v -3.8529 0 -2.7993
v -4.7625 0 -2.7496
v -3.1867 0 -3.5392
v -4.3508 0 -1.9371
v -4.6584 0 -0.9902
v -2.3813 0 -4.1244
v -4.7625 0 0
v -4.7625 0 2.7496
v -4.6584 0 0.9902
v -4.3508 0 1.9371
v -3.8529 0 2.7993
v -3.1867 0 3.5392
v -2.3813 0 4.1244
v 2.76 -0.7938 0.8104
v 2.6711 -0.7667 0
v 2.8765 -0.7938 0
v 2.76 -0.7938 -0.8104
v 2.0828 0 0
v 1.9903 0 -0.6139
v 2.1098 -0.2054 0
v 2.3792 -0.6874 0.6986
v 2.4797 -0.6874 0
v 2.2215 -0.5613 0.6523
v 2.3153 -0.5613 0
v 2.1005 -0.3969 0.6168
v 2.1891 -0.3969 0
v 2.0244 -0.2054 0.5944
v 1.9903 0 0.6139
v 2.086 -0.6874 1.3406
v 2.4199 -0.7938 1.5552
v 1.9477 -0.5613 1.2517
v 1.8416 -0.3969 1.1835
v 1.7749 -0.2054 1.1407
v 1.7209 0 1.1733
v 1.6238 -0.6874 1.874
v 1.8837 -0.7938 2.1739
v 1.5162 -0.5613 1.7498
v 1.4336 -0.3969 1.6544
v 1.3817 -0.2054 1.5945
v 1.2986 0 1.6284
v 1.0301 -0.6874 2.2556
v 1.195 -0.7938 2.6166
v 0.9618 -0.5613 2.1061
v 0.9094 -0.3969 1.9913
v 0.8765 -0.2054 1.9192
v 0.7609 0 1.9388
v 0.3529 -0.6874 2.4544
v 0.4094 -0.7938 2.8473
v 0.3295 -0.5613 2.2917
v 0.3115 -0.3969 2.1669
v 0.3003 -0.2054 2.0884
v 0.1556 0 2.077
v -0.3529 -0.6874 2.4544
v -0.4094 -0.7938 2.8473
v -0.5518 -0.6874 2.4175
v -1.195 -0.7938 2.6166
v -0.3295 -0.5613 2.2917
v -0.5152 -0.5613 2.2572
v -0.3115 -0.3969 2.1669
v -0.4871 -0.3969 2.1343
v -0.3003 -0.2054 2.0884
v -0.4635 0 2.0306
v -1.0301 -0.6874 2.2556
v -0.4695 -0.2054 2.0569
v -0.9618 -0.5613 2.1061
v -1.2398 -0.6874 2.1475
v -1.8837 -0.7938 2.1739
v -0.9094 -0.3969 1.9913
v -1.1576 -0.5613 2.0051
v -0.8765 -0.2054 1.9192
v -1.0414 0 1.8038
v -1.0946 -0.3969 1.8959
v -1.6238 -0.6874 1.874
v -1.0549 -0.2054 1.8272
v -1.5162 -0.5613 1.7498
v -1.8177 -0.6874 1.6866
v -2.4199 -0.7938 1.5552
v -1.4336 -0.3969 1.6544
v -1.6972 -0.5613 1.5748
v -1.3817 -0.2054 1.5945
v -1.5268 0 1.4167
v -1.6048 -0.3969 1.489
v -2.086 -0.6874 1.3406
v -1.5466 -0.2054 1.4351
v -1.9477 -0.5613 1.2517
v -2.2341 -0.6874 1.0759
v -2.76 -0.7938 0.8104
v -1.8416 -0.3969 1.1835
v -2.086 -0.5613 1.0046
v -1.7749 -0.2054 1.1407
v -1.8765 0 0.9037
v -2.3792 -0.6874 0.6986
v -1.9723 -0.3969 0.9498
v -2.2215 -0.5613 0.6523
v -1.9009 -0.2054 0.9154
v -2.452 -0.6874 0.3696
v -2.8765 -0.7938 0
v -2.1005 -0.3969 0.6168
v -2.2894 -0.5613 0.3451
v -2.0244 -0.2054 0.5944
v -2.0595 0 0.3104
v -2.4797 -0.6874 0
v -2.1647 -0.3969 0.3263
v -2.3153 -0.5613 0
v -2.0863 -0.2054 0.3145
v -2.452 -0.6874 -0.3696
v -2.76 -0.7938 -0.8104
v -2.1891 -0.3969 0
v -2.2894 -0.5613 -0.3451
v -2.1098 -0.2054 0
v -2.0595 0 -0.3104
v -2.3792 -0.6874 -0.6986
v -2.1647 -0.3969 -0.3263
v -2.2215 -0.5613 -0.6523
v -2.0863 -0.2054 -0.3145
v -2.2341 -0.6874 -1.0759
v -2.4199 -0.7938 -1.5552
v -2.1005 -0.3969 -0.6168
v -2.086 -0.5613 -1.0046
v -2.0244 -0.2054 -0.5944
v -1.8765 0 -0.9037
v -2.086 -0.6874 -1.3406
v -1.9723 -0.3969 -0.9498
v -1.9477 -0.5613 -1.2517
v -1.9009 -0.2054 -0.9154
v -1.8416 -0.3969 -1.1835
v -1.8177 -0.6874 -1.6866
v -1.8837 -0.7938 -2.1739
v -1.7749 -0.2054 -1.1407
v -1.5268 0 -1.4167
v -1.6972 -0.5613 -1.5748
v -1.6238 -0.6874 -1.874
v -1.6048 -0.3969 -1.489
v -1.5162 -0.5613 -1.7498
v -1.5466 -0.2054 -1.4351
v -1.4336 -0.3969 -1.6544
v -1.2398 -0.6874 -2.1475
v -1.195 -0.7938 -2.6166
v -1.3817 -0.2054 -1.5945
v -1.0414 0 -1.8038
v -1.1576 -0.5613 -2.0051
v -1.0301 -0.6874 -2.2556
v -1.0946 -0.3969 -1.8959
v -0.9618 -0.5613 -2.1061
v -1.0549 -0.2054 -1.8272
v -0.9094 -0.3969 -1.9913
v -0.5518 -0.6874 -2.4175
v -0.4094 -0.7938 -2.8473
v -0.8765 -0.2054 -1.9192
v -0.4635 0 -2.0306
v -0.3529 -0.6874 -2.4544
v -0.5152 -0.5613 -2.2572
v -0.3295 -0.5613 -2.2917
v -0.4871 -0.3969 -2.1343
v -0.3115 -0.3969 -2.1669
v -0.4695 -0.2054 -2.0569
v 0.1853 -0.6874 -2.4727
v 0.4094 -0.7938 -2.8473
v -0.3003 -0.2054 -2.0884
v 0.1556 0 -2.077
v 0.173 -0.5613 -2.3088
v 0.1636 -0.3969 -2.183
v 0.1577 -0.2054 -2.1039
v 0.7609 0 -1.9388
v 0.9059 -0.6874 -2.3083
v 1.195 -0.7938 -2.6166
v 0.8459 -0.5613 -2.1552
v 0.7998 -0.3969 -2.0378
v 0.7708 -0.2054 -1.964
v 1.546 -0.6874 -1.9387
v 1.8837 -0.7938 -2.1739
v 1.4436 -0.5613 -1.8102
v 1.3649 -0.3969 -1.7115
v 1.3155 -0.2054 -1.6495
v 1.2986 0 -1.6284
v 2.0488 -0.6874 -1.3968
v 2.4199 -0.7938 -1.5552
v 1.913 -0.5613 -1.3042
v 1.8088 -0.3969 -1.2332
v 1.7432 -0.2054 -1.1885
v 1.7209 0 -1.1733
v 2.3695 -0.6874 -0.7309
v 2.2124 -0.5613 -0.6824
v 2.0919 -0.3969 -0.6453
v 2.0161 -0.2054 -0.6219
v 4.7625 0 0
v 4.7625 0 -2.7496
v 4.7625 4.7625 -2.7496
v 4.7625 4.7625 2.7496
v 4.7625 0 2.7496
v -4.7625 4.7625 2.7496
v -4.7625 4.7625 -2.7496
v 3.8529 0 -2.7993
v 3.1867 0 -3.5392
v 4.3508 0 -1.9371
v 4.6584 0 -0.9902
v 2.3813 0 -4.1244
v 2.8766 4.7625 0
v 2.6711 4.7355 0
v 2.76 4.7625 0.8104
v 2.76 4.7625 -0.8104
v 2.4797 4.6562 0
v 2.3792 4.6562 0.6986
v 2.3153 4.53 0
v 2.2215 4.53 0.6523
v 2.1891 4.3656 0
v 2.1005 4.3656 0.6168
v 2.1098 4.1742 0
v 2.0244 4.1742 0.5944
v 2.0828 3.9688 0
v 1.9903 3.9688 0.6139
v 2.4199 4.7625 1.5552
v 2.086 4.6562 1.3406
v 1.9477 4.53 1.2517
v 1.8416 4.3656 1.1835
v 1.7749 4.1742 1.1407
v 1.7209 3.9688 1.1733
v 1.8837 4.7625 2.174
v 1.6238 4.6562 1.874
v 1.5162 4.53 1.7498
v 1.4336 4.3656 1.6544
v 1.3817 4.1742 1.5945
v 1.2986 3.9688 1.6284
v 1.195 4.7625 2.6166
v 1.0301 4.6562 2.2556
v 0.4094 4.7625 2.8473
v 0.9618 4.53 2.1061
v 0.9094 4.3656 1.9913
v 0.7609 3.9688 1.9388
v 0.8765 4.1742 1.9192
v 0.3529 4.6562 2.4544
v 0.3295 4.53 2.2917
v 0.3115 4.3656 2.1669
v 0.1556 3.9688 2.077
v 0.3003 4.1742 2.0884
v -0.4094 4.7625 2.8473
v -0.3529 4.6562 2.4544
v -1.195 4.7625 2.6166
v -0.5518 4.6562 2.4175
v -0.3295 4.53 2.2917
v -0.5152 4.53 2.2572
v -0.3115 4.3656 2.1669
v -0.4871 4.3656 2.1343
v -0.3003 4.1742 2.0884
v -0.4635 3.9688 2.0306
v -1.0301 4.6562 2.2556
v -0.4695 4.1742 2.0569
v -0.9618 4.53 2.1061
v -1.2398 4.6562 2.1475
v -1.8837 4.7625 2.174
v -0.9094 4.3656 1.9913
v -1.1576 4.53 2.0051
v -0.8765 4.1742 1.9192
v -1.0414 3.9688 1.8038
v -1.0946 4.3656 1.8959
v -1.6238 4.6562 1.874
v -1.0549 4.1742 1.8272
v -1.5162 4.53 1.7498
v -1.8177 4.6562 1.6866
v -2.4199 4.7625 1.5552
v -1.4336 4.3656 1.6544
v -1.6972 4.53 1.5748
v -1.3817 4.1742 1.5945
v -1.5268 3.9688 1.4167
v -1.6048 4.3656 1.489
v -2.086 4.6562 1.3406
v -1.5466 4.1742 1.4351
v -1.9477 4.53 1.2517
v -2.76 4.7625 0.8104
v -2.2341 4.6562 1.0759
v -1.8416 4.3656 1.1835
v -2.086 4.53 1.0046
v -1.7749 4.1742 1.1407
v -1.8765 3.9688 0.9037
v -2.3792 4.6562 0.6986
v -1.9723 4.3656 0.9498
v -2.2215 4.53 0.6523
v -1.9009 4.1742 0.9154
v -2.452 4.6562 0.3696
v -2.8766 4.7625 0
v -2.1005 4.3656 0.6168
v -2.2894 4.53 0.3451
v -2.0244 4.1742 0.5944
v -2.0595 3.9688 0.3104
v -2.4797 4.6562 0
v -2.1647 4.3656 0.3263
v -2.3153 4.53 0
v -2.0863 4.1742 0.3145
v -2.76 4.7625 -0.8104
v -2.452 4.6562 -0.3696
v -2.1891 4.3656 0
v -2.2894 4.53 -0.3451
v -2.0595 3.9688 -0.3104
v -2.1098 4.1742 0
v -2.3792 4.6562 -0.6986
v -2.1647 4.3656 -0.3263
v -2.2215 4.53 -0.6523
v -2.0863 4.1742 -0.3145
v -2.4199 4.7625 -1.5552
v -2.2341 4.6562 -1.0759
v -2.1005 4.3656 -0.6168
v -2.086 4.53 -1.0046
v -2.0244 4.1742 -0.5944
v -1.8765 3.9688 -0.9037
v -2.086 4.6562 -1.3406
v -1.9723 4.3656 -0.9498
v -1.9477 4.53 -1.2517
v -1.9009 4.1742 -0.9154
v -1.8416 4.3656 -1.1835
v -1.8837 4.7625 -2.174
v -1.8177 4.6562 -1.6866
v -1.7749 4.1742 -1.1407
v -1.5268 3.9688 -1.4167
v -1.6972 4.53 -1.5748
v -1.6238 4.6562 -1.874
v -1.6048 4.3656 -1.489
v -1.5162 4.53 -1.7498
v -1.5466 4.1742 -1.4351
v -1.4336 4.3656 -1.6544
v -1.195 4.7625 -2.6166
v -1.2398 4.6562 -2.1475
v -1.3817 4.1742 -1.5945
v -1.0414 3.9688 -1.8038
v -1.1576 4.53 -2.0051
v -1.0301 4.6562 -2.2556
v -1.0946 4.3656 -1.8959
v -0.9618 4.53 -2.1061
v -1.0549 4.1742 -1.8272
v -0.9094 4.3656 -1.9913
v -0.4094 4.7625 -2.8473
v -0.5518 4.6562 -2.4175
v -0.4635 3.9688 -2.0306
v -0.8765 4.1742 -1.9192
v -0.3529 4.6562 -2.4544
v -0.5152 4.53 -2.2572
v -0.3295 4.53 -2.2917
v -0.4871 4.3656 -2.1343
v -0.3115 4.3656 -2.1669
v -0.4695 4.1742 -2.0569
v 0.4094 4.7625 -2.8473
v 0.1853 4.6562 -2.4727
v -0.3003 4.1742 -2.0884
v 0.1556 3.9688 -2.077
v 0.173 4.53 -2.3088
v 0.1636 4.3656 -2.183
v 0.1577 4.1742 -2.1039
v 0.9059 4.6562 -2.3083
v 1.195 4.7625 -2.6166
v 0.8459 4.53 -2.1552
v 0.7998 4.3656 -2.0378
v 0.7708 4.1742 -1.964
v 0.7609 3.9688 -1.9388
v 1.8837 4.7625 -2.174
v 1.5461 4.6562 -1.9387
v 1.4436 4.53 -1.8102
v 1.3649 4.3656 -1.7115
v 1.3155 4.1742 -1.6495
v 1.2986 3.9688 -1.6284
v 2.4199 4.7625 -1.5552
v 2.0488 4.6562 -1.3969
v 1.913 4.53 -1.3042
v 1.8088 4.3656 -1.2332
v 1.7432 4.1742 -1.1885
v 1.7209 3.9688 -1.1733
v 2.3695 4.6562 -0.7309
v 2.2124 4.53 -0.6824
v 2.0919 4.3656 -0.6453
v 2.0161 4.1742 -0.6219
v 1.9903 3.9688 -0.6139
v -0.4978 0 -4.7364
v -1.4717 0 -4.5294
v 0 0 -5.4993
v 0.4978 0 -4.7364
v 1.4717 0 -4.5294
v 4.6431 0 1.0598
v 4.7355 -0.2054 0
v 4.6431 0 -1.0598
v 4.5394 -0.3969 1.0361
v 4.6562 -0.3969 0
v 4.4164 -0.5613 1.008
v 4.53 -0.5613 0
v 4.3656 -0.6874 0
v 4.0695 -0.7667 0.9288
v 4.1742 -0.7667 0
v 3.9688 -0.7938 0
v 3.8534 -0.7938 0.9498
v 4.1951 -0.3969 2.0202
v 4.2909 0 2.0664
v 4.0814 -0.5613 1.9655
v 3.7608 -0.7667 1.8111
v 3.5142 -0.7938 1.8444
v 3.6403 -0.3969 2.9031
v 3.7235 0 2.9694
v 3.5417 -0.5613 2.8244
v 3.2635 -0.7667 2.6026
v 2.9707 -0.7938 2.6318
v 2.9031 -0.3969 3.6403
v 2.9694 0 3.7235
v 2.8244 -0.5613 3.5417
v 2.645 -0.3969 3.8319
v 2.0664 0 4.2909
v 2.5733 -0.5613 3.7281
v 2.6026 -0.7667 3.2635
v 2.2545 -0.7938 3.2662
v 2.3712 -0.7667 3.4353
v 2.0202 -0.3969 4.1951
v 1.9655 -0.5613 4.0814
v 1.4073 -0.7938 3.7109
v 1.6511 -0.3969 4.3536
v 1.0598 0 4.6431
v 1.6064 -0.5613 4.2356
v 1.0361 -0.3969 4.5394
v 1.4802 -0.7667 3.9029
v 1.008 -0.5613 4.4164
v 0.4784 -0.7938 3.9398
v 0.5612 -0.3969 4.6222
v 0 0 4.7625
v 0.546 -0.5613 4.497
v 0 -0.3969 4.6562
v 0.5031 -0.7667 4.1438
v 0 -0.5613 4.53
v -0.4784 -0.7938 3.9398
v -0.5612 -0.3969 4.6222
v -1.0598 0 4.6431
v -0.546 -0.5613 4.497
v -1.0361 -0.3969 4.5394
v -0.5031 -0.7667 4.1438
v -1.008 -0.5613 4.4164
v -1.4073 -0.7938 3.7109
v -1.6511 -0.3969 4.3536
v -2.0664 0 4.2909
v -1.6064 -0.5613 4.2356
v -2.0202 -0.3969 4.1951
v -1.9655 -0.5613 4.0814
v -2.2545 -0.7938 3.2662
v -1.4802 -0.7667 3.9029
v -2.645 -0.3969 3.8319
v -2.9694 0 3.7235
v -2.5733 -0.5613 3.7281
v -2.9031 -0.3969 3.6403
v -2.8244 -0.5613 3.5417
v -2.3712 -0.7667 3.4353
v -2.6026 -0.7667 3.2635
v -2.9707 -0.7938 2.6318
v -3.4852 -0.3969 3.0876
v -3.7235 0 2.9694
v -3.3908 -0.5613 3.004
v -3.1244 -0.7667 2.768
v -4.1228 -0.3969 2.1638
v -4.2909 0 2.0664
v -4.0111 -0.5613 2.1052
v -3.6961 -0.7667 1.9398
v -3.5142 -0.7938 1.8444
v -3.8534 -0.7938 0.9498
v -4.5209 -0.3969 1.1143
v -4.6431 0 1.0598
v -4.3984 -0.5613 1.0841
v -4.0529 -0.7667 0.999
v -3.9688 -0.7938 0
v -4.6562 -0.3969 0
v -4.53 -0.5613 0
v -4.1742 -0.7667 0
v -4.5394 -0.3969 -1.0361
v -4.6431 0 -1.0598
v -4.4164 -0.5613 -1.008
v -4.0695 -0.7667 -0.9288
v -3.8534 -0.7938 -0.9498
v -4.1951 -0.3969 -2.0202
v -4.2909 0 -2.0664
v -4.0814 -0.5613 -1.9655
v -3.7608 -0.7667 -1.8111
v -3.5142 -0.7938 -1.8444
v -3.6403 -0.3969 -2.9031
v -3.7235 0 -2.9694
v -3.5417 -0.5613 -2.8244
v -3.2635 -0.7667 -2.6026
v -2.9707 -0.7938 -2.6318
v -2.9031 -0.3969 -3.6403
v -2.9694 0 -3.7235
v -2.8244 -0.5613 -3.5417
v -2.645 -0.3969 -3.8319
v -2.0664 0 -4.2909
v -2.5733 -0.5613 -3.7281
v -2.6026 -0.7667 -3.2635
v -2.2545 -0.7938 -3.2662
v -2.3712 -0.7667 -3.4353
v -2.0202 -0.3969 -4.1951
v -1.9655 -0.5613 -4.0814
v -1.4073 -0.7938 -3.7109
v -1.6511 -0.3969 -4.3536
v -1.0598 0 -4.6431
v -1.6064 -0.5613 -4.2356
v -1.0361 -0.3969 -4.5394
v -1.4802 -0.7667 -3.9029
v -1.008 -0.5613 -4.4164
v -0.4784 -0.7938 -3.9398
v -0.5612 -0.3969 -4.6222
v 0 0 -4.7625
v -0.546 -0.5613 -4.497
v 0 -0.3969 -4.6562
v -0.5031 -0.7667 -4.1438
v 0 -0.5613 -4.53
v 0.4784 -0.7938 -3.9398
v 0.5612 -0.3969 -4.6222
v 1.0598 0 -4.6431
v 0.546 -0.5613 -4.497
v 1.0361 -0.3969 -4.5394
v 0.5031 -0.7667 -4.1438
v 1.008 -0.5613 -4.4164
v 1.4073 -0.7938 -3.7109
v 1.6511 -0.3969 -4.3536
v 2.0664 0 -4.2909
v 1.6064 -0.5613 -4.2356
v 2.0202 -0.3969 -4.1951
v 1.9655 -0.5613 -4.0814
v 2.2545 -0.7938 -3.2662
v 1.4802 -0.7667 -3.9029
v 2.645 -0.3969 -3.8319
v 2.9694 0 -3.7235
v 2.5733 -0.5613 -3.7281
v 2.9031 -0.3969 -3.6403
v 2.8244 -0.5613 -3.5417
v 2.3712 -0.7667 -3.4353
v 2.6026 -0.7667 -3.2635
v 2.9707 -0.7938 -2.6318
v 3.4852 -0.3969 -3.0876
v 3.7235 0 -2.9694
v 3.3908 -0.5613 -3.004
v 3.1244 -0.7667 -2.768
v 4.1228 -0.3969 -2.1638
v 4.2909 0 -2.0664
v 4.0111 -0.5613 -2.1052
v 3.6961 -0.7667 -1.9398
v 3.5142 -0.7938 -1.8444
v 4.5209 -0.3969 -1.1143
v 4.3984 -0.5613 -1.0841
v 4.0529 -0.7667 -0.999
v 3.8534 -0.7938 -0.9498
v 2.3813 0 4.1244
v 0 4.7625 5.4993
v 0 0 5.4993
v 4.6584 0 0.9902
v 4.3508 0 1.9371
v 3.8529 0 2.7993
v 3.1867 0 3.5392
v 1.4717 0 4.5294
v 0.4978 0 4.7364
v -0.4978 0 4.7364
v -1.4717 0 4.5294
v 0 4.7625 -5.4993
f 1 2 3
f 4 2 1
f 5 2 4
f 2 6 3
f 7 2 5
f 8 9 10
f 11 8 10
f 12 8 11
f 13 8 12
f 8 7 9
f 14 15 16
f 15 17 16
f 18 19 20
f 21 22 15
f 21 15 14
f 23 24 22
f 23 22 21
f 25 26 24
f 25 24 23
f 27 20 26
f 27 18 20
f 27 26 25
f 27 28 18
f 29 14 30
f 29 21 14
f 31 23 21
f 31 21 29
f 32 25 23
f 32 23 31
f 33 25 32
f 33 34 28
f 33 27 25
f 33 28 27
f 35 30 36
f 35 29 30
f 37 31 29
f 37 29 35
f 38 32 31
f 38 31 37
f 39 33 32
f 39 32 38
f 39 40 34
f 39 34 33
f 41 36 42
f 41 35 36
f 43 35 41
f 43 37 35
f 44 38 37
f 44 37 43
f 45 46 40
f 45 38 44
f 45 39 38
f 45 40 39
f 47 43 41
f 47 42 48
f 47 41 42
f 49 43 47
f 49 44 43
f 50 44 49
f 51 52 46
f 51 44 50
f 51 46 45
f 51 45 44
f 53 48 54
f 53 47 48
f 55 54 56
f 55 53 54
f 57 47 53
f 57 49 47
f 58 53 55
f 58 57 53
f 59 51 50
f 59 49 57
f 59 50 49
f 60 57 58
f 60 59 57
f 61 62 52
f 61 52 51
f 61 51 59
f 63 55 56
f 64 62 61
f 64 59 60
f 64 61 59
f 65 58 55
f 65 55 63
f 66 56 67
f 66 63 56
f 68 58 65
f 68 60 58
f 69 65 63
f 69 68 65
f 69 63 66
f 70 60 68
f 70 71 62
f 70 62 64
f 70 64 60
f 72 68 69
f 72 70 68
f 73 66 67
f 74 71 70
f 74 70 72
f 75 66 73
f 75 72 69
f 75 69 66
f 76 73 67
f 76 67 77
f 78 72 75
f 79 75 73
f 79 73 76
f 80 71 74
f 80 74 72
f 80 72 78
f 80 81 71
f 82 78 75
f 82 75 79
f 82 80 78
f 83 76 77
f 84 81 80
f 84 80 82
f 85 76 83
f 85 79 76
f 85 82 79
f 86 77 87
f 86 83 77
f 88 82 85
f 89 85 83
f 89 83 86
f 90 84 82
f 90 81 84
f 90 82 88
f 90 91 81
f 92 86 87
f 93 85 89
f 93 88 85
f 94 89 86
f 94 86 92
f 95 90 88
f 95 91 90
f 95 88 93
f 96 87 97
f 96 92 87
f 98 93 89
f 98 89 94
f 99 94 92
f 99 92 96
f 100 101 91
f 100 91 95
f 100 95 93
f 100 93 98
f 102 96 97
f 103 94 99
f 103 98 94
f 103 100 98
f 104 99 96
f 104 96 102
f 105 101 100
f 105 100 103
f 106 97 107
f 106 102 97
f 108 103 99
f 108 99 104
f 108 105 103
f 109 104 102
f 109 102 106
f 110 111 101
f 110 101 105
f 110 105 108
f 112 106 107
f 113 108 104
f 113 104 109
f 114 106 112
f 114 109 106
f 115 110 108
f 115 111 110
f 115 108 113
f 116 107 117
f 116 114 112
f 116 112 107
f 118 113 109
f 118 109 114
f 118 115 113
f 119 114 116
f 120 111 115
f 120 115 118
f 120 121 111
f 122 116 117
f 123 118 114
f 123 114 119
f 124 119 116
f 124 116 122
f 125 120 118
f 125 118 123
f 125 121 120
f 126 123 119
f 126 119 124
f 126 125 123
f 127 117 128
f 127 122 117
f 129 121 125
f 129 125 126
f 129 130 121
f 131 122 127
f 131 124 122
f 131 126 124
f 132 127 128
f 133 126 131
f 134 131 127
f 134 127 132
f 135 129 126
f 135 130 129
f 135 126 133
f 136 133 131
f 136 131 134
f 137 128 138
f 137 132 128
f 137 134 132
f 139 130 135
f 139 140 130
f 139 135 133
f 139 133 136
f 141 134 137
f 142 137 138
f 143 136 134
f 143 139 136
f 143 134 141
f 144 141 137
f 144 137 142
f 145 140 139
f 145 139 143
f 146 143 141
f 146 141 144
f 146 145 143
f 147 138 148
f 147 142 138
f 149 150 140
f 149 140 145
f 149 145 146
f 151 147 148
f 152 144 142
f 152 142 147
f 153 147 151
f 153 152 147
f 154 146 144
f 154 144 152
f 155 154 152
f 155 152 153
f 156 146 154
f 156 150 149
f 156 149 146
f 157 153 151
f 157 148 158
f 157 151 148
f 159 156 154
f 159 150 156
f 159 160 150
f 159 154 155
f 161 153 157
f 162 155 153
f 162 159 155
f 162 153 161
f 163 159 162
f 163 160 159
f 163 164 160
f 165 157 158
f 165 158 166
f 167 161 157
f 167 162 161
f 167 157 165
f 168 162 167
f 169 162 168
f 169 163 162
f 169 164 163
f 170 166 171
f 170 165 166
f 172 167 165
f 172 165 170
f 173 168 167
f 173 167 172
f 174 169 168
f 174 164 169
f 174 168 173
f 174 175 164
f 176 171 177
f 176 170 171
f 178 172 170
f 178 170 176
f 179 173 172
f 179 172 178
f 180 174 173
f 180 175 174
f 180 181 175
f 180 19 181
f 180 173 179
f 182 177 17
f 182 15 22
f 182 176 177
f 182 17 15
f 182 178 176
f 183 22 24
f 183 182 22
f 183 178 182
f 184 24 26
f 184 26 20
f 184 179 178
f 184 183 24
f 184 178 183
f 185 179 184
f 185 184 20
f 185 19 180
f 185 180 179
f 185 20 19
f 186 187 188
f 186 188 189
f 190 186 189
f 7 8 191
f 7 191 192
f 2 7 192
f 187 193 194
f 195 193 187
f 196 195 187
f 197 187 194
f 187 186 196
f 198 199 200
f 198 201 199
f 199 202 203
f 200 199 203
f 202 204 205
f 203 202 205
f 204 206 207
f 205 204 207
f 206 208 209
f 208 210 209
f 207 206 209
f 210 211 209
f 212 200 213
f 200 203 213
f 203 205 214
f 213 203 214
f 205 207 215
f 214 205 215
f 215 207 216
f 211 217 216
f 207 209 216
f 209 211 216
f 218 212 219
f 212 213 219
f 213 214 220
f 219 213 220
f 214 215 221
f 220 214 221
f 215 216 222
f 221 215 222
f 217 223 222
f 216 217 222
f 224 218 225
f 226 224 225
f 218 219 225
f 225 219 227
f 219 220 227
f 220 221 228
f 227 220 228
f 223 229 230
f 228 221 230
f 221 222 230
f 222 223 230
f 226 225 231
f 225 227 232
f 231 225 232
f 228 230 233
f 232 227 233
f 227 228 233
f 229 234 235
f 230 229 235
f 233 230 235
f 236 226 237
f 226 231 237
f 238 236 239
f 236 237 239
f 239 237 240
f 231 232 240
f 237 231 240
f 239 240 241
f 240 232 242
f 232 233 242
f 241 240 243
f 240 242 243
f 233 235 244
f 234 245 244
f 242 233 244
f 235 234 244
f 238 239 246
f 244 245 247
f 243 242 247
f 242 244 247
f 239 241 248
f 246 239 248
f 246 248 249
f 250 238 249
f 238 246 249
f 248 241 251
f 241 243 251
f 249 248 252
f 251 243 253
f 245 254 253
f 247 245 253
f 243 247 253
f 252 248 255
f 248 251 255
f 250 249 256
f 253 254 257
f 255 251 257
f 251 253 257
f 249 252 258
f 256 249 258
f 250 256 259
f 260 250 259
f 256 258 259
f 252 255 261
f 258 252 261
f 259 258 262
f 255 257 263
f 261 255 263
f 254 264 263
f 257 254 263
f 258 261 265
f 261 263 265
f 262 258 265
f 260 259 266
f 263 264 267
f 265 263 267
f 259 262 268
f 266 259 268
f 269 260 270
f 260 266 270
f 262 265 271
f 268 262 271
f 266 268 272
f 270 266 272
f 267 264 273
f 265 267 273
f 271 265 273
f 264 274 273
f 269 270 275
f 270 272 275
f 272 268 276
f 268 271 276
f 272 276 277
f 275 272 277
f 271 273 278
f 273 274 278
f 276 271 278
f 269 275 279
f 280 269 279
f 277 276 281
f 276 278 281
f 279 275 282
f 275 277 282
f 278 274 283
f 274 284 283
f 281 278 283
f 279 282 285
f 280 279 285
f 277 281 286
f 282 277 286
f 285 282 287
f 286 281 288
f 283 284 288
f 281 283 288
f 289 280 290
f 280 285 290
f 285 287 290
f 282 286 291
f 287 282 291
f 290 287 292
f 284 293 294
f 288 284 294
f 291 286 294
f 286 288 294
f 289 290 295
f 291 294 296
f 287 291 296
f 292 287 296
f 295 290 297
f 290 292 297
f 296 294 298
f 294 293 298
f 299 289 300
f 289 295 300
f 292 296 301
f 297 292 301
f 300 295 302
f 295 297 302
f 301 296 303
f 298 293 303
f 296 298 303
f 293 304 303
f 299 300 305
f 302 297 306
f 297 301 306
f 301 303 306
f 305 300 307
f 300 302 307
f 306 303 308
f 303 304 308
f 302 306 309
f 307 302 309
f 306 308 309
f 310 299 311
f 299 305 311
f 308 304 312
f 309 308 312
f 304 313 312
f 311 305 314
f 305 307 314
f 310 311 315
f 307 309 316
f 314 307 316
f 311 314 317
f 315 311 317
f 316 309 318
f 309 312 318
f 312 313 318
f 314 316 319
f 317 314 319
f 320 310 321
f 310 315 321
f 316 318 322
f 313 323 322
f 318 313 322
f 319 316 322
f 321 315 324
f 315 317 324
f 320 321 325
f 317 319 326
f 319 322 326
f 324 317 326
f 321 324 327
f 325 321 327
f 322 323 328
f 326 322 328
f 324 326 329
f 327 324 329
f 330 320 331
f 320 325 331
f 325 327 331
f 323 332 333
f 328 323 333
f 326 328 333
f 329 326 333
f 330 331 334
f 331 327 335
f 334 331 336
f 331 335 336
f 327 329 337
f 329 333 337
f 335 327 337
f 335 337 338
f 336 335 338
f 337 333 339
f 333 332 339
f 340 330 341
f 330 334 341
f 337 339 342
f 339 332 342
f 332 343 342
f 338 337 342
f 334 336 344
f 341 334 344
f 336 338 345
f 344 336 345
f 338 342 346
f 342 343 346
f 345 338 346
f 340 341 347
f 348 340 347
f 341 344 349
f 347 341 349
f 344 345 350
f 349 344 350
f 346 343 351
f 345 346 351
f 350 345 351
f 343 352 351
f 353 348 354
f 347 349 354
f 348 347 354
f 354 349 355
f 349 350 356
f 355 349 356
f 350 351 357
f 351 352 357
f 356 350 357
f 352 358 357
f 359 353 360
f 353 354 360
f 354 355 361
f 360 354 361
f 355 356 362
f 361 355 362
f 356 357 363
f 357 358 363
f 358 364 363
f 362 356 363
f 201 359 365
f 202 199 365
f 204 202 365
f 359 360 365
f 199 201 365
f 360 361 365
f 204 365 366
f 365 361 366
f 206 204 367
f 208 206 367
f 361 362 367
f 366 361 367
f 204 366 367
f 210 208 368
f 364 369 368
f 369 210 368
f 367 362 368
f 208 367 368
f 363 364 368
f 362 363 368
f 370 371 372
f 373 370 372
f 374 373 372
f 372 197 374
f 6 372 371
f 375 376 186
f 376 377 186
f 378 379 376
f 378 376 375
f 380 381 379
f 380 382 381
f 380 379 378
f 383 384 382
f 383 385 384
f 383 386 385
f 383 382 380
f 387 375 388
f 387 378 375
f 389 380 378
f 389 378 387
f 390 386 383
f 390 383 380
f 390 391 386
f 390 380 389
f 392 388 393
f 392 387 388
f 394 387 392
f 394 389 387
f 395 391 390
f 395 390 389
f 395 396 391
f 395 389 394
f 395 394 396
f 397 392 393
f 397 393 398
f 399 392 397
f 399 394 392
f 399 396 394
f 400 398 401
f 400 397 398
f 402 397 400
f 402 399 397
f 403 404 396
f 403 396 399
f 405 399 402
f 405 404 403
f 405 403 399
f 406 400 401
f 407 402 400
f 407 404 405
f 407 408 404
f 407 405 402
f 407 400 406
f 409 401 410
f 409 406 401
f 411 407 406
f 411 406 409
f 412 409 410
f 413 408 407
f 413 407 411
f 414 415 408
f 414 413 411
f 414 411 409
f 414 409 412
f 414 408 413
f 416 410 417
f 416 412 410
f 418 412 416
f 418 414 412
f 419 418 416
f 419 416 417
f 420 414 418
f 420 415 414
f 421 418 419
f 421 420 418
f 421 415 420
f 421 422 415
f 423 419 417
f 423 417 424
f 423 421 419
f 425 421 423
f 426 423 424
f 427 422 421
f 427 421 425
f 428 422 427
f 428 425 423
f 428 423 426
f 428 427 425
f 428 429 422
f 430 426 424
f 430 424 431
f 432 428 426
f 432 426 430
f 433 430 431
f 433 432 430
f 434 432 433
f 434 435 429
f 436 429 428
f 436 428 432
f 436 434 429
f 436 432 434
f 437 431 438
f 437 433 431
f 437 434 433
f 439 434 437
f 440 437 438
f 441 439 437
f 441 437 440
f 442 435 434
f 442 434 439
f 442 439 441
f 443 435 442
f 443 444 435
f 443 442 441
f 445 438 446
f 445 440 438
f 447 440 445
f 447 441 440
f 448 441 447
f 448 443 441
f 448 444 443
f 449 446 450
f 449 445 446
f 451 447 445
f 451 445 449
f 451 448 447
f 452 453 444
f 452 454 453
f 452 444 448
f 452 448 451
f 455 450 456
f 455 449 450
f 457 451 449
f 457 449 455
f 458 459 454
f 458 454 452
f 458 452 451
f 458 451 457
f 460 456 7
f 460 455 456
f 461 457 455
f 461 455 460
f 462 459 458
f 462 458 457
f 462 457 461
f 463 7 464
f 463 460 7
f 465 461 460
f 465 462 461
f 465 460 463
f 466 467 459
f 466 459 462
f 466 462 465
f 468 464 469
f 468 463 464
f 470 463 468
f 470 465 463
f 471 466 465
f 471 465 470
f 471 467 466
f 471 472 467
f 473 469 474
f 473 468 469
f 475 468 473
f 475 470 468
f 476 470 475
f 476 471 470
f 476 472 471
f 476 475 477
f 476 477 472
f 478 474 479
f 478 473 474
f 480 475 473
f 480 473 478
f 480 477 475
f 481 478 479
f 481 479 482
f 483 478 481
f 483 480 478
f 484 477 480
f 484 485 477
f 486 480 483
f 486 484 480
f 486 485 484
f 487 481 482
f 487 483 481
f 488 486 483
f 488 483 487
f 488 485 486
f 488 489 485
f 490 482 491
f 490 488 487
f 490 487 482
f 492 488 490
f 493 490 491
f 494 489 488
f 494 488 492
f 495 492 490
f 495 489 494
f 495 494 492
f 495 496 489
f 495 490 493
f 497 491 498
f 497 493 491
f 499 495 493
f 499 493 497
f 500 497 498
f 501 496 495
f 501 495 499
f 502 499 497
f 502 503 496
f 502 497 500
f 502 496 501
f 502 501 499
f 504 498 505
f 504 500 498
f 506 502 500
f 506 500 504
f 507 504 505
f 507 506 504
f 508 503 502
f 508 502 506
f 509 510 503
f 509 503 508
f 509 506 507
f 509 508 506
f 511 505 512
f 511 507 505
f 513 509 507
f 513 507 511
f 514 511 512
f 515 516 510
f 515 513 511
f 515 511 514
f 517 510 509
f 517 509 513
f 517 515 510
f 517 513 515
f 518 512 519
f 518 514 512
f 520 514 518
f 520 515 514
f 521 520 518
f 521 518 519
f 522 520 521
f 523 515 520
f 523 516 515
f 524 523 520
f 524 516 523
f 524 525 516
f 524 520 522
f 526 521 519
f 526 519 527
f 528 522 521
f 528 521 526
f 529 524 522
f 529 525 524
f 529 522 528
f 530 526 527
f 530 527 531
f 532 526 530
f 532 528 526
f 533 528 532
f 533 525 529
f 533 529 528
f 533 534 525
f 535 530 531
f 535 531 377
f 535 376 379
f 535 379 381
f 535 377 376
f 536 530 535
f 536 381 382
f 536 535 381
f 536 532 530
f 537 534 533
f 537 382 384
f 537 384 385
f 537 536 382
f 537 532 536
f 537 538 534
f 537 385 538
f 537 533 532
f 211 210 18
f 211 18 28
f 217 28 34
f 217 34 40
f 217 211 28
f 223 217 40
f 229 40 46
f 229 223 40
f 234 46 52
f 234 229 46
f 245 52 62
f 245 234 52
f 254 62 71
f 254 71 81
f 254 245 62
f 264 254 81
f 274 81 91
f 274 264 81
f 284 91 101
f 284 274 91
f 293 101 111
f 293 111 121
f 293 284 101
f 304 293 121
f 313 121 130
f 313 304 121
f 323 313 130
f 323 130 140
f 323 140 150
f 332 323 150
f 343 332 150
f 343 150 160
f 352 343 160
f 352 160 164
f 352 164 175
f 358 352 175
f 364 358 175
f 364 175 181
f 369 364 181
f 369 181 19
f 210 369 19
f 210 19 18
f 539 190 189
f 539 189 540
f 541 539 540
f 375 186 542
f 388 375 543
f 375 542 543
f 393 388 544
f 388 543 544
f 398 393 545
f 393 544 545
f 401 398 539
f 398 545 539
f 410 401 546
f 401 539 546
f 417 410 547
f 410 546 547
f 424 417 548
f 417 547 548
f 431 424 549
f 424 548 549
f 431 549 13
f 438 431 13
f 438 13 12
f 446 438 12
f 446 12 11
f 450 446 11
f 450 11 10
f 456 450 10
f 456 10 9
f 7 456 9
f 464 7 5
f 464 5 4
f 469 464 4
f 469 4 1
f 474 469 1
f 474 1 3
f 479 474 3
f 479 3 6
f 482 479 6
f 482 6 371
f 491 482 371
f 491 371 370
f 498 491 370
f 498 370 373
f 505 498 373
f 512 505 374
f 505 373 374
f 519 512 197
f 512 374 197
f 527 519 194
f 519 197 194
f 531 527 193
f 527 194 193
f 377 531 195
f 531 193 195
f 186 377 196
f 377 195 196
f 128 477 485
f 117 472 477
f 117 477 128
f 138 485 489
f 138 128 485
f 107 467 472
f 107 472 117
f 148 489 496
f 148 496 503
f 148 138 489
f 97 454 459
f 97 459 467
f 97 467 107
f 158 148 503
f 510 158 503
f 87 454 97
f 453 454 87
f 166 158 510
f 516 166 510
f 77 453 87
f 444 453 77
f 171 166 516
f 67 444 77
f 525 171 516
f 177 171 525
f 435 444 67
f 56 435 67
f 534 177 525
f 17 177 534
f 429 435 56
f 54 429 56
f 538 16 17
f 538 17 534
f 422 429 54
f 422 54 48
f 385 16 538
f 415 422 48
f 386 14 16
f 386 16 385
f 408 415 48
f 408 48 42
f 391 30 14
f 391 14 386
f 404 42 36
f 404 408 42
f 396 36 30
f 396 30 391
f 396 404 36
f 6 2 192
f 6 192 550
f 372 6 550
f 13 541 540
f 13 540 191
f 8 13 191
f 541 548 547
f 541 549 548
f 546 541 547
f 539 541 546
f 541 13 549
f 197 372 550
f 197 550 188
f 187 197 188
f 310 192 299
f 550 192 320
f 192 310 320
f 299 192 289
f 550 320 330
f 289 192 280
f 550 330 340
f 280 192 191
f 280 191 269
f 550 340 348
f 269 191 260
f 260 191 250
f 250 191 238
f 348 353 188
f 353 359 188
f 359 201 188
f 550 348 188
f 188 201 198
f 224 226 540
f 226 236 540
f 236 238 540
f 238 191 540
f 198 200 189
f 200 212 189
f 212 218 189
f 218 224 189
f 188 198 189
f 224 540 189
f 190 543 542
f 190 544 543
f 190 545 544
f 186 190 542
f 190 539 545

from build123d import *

# Parameters (mm, degrees)
F0_R     = 2.0828
F1_DEPTH = 4.7625
F2_R     = 4.7625
F2_R_2   = 2.0828
F3_DEPTH = 0.79375
F4_R     = 0.79374
F5_R     = 0.79375


# Not quite as in the source:
# - a fillet or chamfer is up to 0.001 mm smaller than in the source, because OpenCascade refuses the exact size


with BuildPart() as f1:
    # F0 (on Front) → F1 (new body)
    with BuildSketch(Plane.XZ):
        Polygon((4.7625, -2.749630657), (4.7625, 2.749630657), (0, 5.499261314), (-4.7625, 2.749630657), (-4.7625, -2.749630657), (0, -5.499261314), align=None)
        Circle(F0_R, mode=Mode.SUBTRACT)
    extrude(amount=-F1_DEPTH)

    # F2 (on face) → F3 (join)
    with BuildSketch(Plane.XZ):
        Circle(F2_R)
        Circle(F2_R_2, mode=Mode.SUBTRACT)
    extrude(amount=F3_DEPTH)

    # F4 (radius 0.79375 in the source; OpenCascade refuses exactly that, so slightly less here)
    f4_edges = [f1.edges().sort_by_distance(p)[0] for p in [
        (-4.7625, -0.79375, 0),
        (-2.0828, -0.79375, 0),
    ]]
    fillet(f4_edges, radius=F4_R)

    # F5
    f5_edges = [f1.edges().sort_by_distance(p)[0] for p in [
        (-2.0828, 4.7625, 0),
    ]]
    fillet(f5_edges, radius=F5_R)


solid = f1.part
